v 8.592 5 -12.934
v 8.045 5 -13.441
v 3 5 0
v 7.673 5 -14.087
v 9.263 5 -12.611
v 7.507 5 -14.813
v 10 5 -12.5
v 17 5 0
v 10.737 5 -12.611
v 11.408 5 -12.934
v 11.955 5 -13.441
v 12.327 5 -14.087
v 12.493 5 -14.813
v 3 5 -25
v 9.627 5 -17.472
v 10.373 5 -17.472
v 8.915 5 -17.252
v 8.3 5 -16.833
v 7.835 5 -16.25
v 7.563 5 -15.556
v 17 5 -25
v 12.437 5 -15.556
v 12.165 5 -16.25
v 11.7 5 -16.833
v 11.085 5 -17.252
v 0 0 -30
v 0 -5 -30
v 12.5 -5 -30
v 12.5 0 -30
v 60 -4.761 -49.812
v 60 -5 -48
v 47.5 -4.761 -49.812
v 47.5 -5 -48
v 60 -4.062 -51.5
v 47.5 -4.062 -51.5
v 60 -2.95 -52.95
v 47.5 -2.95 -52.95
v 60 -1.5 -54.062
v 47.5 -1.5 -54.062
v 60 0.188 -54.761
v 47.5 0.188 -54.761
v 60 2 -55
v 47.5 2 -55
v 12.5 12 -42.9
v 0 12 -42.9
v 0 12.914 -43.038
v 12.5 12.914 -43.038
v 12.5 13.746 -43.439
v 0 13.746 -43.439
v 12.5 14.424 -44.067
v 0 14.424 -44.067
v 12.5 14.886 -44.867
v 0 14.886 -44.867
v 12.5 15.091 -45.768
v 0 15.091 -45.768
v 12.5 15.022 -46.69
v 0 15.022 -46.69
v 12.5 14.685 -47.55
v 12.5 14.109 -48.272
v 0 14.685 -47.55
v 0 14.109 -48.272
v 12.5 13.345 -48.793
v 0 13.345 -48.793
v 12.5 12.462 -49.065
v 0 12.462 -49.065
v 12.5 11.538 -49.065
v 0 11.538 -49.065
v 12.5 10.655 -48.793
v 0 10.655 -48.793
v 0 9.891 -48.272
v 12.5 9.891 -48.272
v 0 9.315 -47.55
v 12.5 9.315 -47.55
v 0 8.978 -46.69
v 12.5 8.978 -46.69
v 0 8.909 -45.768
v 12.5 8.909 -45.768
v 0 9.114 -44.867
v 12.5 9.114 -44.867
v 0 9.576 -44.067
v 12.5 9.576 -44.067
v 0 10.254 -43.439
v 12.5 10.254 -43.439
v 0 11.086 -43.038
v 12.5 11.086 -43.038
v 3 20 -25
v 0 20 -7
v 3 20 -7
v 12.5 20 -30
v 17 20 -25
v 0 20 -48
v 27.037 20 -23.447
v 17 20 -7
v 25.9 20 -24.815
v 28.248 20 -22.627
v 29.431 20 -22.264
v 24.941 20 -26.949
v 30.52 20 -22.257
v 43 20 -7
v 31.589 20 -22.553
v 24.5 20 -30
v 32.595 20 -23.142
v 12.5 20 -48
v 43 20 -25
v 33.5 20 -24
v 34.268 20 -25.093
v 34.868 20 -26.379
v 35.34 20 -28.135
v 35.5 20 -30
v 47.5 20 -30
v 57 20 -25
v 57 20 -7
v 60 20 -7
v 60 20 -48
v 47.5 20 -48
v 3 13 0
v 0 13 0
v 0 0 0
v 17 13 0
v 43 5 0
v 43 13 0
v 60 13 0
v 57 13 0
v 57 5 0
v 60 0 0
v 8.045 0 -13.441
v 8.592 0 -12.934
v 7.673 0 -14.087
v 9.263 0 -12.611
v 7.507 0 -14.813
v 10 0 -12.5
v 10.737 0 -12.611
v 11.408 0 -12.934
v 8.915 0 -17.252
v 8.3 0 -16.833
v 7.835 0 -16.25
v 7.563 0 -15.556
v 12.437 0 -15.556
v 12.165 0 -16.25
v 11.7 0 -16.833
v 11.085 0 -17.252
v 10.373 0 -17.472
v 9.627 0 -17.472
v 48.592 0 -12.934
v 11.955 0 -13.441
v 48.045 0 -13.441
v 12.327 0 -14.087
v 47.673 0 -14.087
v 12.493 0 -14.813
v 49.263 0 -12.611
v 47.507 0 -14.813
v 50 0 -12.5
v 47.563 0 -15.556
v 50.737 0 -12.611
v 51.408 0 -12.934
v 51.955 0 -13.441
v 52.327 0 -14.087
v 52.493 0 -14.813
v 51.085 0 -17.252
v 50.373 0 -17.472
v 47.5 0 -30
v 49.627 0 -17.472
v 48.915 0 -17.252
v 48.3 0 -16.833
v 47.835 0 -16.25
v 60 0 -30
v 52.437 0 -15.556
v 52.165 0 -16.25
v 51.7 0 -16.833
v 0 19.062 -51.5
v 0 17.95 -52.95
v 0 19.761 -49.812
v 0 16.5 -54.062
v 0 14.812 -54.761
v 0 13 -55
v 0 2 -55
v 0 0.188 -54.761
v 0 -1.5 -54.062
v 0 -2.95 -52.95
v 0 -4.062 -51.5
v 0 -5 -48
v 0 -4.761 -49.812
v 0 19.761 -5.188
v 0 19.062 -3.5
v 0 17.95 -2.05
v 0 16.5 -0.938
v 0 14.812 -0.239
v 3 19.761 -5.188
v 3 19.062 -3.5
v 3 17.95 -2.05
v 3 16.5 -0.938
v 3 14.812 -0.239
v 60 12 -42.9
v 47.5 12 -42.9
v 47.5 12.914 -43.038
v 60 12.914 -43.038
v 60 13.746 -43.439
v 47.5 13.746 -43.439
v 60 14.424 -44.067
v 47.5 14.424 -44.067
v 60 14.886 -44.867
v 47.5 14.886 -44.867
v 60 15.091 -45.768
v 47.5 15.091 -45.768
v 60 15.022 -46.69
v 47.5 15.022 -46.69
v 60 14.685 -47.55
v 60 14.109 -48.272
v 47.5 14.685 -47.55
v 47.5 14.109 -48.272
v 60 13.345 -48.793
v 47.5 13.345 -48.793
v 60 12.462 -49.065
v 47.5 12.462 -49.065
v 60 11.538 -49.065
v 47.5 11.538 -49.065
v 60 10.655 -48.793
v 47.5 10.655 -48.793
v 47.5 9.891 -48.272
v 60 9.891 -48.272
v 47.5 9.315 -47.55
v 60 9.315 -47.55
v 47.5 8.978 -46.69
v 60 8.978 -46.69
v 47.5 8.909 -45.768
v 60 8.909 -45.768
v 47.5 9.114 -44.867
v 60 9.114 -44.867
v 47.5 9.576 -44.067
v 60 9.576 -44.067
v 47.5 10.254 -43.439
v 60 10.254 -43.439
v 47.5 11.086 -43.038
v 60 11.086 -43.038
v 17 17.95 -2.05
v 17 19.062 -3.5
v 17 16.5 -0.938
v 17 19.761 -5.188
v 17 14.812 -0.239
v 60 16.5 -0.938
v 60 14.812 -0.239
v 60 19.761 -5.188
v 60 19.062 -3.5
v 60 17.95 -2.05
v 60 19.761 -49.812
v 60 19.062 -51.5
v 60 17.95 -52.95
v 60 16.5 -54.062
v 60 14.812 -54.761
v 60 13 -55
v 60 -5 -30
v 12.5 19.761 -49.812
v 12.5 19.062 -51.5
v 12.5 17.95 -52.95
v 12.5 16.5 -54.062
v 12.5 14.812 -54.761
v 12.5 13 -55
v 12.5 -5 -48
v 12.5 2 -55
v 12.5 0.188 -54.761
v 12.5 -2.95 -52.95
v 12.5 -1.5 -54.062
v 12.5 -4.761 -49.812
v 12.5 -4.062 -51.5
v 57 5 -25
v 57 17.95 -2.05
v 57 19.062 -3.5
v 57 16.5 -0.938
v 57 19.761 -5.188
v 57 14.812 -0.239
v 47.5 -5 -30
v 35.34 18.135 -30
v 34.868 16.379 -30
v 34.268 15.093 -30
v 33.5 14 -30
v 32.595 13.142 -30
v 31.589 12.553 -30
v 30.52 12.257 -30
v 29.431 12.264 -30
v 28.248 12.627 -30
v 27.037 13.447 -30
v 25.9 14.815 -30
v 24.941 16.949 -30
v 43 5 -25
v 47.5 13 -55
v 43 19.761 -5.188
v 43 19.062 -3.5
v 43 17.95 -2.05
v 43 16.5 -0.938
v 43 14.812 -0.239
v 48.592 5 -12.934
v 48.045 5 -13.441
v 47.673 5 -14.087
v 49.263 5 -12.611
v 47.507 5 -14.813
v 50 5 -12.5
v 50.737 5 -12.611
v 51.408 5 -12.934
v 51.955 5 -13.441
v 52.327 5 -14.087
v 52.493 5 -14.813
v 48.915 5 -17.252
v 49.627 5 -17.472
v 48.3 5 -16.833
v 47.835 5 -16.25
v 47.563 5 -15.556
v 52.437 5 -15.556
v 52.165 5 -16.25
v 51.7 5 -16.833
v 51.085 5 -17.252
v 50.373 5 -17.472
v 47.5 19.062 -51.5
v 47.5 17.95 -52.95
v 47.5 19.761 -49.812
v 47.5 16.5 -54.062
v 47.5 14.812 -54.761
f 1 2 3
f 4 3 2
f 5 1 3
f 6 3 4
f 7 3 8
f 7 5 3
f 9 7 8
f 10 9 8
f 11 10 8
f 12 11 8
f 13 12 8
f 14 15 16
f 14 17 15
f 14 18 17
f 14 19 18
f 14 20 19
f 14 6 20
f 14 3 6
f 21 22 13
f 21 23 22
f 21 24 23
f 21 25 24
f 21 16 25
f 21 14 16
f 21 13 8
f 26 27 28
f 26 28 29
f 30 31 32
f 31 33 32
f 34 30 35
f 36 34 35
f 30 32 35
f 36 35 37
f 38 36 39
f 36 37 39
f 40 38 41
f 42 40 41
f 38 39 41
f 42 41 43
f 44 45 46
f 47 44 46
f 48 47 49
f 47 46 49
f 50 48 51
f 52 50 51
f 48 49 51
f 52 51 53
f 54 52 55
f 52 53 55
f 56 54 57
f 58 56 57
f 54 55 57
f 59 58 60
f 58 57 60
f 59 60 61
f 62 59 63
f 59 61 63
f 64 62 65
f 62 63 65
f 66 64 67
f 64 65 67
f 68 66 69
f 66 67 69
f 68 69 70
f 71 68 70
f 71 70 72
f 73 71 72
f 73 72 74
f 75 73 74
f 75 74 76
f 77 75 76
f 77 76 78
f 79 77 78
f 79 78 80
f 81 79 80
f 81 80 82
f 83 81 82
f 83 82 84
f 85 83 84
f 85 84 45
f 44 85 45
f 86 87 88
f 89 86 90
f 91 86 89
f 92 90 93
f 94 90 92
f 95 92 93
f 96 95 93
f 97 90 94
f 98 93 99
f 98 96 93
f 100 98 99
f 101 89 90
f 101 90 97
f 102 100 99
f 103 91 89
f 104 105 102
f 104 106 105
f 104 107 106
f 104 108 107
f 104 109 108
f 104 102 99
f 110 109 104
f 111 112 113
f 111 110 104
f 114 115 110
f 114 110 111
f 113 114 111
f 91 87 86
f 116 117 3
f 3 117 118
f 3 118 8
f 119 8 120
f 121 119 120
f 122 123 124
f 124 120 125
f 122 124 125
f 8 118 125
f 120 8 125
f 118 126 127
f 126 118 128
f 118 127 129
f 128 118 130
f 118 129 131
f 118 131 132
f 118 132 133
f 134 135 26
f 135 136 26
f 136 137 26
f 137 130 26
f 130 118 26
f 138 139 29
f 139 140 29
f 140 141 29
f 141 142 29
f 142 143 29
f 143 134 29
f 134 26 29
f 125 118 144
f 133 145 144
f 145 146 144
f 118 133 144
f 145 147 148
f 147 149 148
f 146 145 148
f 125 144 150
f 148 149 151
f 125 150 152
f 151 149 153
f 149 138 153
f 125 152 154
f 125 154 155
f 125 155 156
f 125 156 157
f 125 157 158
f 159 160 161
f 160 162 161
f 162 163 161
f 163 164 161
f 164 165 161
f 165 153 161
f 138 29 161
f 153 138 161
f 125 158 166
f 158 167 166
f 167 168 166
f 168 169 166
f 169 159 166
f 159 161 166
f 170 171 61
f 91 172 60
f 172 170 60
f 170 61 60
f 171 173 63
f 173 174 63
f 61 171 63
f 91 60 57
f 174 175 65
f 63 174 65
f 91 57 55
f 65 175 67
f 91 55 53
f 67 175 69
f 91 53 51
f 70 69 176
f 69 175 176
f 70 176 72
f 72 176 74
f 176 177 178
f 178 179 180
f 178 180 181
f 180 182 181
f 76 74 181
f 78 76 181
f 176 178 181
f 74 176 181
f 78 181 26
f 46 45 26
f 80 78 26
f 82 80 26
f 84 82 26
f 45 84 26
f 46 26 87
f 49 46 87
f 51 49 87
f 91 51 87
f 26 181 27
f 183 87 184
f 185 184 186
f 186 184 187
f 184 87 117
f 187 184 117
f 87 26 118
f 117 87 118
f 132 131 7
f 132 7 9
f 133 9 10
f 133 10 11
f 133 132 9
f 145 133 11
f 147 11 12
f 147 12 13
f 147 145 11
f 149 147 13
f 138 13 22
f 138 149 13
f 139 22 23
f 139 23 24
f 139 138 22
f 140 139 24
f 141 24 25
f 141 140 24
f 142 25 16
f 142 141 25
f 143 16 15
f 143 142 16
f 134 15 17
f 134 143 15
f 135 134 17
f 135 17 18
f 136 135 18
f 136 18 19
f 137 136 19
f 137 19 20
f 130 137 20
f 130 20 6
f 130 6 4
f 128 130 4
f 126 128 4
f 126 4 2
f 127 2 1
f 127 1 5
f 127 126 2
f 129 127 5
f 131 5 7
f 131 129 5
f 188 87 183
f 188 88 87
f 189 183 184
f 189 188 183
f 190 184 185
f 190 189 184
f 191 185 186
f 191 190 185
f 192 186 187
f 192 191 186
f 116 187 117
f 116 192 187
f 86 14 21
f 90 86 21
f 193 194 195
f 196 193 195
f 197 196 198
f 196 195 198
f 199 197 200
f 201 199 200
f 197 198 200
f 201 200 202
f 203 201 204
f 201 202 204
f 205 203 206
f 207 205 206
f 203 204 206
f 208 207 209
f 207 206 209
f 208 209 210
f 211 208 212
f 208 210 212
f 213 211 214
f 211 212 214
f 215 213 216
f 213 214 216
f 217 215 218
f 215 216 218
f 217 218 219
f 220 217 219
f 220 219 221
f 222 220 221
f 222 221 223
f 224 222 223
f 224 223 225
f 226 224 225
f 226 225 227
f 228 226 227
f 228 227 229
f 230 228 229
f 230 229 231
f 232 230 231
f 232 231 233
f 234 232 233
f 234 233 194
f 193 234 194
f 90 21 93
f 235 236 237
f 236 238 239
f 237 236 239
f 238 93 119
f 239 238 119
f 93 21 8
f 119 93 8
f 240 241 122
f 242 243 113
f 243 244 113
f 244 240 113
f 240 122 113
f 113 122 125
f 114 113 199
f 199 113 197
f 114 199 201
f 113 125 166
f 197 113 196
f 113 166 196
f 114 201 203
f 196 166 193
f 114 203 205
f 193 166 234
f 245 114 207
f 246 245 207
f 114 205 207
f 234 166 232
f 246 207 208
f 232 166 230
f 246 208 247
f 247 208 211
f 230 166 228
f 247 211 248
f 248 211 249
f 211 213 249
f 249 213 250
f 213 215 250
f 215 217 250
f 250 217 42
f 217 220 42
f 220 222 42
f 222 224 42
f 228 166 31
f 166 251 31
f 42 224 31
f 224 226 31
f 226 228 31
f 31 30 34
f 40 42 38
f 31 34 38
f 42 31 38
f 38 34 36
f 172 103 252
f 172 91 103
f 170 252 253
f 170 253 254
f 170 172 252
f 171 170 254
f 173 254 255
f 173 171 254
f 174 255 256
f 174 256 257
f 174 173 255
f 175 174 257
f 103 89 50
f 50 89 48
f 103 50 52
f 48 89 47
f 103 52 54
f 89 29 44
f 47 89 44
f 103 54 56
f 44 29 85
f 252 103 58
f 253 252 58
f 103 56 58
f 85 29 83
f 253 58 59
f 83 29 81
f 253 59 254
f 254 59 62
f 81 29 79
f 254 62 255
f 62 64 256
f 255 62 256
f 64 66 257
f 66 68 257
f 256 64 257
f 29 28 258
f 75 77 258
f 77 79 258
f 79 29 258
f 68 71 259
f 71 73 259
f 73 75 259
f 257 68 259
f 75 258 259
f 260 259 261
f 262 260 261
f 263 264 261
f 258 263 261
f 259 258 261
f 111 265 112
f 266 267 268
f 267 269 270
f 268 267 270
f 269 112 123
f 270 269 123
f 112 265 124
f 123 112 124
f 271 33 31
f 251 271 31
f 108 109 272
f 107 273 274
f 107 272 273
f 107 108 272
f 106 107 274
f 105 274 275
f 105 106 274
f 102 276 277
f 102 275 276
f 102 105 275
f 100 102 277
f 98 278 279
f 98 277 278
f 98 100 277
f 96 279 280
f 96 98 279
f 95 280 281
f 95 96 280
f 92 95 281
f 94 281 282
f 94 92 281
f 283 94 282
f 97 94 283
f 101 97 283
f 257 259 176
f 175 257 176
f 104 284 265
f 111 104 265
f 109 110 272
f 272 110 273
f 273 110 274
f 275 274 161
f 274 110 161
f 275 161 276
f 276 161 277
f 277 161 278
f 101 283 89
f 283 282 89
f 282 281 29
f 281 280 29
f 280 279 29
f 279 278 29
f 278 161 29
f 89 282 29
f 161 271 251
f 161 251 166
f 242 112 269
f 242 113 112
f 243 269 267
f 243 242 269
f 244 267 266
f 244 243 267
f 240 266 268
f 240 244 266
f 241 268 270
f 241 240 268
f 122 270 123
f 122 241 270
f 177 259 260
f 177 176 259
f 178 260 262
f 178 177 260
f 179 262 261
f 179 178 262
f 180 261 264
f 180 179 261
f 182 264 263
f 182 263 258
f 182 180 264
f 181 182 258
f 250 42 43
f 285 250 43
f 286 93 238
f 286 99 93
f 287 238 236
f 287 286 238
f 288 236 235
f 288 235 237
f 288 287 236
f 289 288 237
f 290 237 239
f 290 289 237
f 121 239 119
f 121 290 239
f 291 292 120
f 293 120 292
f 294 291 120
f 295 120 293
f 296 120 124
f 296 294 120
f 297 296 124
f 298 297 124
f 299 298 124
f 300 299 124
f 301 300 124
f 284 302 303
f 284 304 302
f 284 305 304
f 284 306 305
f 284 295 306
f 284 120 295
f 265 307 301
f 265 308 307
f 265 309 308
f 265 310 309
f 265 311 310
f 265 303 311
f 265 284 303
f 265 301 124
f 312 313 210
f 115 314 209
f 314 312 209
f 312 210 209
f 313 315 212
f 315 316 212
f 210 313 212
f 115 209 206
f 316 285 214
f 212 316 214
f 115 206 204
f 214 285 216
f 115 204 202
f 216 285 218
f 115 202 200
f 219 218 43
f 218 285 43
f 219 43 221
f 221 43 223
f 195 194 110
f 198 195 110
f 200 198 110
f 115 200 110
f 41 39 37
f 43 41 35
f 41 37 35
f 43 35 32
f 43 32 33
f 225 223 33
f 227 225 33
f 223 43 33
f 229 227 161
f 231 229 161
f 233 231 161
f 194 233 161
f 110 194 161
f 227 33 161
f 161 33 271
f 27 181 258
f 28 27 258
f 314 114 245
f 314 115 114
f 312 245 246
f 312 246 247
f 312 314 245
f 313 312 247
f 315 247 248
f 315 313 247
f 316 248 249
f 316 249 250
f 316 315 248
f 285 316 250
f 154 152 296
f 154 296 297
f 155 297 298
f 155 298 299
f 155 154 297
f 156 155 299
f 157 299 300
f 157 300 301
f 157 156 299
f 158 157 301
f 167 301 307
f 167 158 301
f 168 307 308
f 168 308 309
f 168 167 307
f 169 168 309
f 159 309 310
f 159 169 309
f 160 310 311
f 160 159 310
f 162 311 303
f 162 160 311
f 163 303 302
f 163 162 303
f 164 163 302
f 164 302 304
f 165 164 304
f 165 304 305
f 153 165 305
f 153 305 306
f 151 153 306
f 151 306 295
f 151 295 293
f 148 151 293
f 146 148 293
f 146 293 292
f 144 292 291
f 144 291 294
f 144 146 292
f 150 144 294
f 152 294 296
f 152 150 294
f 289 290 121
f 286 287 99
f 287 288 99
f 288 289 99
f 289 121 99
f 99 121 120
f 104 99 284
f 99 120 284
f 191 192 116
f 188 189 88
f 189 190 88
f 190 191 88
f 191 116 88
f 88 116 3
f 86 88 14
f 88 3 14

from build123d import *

# Parameters (mm, degrees)
CROQUIS1_R                   = 2.5
SALIENTE_EXTRUIR1_DEPTH      = 5
SALIENTE_EXTRUIR2_DEPTH      = 15
SALIENTE_EXTRUIR2_DEPTH_BACK = 10
CORTAR_EXTRUIR2_REACH        = 85.815
CROQUIS4_R                   = 3.1
CROQUIS4_W                   = 30
CROQUIS4_H                   = 5
REDONDEO2_R                  = 7
CORTAR_EXTRUIR3_DEPTH        = 10
CORTAR_EXTRUIR3_DEPTH_BACK   = 10
CROQUIS5_R                   = 5.5


with BuildPart() as part:
    # Croquis1 → Saliente-Extruir1 (new body)
    with BuildSketch(Plane(origin=(0, 0, 0), x_dir=(1, 0, 0), z_dir=(0, 1, 0))):
        Polygon((0, 0), (60, 0), (60, 30), (60, 55), (47.5, 55), (47.5, 30), (12.5, 30), (12.5, 55), (0, 55), (0, 30), align=None)
        with Locations(Location((10, 15, 0), (0, 0, 270))):
            Circle(CROQUIS1_R, mode=Mode.SUBTRACT)
        with Locations(Location((50, 15, 0), (0, 0, 270))):
            Circle(CROQUIS1_R, mode=Mode.SUBTRACT)
    extrude(amount=SALIENTE_EXTRUIR1_DEPTH)

    # Croquis2 → Saliente-Extruir2 (add, two sides: drawn at the far end of the back side and taken through both)
    with BuildSketch(Plane(origin=(0, 5, 0), x_dir=(1, 0, 0), z_dir=(0, 1, 0)).offset(-SALIENTE_EXTRUIR2_DEPTH_BACK)):
        Polygon((3, 0), (3, 25), (17, 25), (17, 0), (43, 0), (43, 25), (57, 25), (57, 0), (60, 0), (60, 55), (47.5, 55), (47.5, 30), (12.5, 30), (12.5, 55), (0, 55), (0, 0), align=None)
    extrude(amount=SALIENTE_EXTRUIR2_DEPTH + SALIENTE_EXTRUIR2_DEPTH_BACK)

    # Cortar-Extruir2: up to this face of the body (flat: up to its plane)
    cortar_extruir2_end = Plane(part.part.faces().sort_by_distance((60, 7.5, -27.5))[0])
    # Croquis4 → Cortar-Extruir2 (cut, up to the picked face)
    with BuildSketch(Plane.ZY, mode=Mode.PRIVATE) as cortar_extruir2_sk1:
        with Locations((-46, 12)):
            Circle(CROQUIS4_R)
    cortar_extruir2_tool1 = split(extrude(cortar_extruir2_sk1.sketch, amount=-CORTAR_EXTRUIR2_REACH, mode=Mode.PRIVATE), bisect_by=cortar_extruir2_end, keep=Keep.BOTH, mode=Mode.PRIVATE)
    # Croquis4 → Cortar-Extruir2 (cut, up to the picked face)
    with BuildSketch(Plane.ZY, mode=Mode.PRIVATE) as cortar_extruir2_sk2:
        with Locations((-15, -2.5)):
            Rectangle(CROQUIS4_W, CROQUIS4_H)
    cortar_extruir2_tool2 = split(extrude(cortar_extruir2_sk2.sketch, amount=-CORTAR_EXTRUIR2_REACH, mode=Mode.PRIVATE), bisect_by=cortar_extruir2_end, keep=Keep.BOTH, mode=Mode.PRIVATE)
    add(cortar_extruir2_tool1.solids().sort_by(Axis((0, 12, -46), (1, 0, 0)))[0], mode=Mode.SUBTRACT)
    add(cortar_extruir2_tool2.solids().sort_by(Axis((0, -2.5, -15), (1, 0, 0)))[0], mode=Mode.SUBTRACT)

    # Redondeo2
    redondeo2_edges = [part.edges().sort_by_distance(p)[0] for p in [
        (6.25, -5, -55),
        (53.75, -5, -55),
        (6.25, 20, -55),
        (1.5, 20, 0),
        (30, 20, 0),
        (58.5, 20, 0),
        (53.75, 20, -55),
    ]]
    fillet(redondeo2_edges, radius=REDONDEO2_R)

    # Croquis5 → Cortar-Extruir3 (cut, two sides: drawn at the far end of the back side and taken through both)
    with BuildSketch(Plane(origin=(0, -5, -5), x_dir=(-1, 0, 0), z_dir=(0, -0.7071067811865488, -0.7071067811865464)).offset(-CORTAR_EXTRUIR3_DEPTH_BACK)):
        with Locations((-30, 35.355339059)):
            Circle(CROQUIS5_R)
    extrude(amount=CORTAR_EXTRUIR3_DEPTH + CORTAR_EXTRUIR3_DEPTH_BACK, mode=Mode.SUBTRACT)


solid = part.part
